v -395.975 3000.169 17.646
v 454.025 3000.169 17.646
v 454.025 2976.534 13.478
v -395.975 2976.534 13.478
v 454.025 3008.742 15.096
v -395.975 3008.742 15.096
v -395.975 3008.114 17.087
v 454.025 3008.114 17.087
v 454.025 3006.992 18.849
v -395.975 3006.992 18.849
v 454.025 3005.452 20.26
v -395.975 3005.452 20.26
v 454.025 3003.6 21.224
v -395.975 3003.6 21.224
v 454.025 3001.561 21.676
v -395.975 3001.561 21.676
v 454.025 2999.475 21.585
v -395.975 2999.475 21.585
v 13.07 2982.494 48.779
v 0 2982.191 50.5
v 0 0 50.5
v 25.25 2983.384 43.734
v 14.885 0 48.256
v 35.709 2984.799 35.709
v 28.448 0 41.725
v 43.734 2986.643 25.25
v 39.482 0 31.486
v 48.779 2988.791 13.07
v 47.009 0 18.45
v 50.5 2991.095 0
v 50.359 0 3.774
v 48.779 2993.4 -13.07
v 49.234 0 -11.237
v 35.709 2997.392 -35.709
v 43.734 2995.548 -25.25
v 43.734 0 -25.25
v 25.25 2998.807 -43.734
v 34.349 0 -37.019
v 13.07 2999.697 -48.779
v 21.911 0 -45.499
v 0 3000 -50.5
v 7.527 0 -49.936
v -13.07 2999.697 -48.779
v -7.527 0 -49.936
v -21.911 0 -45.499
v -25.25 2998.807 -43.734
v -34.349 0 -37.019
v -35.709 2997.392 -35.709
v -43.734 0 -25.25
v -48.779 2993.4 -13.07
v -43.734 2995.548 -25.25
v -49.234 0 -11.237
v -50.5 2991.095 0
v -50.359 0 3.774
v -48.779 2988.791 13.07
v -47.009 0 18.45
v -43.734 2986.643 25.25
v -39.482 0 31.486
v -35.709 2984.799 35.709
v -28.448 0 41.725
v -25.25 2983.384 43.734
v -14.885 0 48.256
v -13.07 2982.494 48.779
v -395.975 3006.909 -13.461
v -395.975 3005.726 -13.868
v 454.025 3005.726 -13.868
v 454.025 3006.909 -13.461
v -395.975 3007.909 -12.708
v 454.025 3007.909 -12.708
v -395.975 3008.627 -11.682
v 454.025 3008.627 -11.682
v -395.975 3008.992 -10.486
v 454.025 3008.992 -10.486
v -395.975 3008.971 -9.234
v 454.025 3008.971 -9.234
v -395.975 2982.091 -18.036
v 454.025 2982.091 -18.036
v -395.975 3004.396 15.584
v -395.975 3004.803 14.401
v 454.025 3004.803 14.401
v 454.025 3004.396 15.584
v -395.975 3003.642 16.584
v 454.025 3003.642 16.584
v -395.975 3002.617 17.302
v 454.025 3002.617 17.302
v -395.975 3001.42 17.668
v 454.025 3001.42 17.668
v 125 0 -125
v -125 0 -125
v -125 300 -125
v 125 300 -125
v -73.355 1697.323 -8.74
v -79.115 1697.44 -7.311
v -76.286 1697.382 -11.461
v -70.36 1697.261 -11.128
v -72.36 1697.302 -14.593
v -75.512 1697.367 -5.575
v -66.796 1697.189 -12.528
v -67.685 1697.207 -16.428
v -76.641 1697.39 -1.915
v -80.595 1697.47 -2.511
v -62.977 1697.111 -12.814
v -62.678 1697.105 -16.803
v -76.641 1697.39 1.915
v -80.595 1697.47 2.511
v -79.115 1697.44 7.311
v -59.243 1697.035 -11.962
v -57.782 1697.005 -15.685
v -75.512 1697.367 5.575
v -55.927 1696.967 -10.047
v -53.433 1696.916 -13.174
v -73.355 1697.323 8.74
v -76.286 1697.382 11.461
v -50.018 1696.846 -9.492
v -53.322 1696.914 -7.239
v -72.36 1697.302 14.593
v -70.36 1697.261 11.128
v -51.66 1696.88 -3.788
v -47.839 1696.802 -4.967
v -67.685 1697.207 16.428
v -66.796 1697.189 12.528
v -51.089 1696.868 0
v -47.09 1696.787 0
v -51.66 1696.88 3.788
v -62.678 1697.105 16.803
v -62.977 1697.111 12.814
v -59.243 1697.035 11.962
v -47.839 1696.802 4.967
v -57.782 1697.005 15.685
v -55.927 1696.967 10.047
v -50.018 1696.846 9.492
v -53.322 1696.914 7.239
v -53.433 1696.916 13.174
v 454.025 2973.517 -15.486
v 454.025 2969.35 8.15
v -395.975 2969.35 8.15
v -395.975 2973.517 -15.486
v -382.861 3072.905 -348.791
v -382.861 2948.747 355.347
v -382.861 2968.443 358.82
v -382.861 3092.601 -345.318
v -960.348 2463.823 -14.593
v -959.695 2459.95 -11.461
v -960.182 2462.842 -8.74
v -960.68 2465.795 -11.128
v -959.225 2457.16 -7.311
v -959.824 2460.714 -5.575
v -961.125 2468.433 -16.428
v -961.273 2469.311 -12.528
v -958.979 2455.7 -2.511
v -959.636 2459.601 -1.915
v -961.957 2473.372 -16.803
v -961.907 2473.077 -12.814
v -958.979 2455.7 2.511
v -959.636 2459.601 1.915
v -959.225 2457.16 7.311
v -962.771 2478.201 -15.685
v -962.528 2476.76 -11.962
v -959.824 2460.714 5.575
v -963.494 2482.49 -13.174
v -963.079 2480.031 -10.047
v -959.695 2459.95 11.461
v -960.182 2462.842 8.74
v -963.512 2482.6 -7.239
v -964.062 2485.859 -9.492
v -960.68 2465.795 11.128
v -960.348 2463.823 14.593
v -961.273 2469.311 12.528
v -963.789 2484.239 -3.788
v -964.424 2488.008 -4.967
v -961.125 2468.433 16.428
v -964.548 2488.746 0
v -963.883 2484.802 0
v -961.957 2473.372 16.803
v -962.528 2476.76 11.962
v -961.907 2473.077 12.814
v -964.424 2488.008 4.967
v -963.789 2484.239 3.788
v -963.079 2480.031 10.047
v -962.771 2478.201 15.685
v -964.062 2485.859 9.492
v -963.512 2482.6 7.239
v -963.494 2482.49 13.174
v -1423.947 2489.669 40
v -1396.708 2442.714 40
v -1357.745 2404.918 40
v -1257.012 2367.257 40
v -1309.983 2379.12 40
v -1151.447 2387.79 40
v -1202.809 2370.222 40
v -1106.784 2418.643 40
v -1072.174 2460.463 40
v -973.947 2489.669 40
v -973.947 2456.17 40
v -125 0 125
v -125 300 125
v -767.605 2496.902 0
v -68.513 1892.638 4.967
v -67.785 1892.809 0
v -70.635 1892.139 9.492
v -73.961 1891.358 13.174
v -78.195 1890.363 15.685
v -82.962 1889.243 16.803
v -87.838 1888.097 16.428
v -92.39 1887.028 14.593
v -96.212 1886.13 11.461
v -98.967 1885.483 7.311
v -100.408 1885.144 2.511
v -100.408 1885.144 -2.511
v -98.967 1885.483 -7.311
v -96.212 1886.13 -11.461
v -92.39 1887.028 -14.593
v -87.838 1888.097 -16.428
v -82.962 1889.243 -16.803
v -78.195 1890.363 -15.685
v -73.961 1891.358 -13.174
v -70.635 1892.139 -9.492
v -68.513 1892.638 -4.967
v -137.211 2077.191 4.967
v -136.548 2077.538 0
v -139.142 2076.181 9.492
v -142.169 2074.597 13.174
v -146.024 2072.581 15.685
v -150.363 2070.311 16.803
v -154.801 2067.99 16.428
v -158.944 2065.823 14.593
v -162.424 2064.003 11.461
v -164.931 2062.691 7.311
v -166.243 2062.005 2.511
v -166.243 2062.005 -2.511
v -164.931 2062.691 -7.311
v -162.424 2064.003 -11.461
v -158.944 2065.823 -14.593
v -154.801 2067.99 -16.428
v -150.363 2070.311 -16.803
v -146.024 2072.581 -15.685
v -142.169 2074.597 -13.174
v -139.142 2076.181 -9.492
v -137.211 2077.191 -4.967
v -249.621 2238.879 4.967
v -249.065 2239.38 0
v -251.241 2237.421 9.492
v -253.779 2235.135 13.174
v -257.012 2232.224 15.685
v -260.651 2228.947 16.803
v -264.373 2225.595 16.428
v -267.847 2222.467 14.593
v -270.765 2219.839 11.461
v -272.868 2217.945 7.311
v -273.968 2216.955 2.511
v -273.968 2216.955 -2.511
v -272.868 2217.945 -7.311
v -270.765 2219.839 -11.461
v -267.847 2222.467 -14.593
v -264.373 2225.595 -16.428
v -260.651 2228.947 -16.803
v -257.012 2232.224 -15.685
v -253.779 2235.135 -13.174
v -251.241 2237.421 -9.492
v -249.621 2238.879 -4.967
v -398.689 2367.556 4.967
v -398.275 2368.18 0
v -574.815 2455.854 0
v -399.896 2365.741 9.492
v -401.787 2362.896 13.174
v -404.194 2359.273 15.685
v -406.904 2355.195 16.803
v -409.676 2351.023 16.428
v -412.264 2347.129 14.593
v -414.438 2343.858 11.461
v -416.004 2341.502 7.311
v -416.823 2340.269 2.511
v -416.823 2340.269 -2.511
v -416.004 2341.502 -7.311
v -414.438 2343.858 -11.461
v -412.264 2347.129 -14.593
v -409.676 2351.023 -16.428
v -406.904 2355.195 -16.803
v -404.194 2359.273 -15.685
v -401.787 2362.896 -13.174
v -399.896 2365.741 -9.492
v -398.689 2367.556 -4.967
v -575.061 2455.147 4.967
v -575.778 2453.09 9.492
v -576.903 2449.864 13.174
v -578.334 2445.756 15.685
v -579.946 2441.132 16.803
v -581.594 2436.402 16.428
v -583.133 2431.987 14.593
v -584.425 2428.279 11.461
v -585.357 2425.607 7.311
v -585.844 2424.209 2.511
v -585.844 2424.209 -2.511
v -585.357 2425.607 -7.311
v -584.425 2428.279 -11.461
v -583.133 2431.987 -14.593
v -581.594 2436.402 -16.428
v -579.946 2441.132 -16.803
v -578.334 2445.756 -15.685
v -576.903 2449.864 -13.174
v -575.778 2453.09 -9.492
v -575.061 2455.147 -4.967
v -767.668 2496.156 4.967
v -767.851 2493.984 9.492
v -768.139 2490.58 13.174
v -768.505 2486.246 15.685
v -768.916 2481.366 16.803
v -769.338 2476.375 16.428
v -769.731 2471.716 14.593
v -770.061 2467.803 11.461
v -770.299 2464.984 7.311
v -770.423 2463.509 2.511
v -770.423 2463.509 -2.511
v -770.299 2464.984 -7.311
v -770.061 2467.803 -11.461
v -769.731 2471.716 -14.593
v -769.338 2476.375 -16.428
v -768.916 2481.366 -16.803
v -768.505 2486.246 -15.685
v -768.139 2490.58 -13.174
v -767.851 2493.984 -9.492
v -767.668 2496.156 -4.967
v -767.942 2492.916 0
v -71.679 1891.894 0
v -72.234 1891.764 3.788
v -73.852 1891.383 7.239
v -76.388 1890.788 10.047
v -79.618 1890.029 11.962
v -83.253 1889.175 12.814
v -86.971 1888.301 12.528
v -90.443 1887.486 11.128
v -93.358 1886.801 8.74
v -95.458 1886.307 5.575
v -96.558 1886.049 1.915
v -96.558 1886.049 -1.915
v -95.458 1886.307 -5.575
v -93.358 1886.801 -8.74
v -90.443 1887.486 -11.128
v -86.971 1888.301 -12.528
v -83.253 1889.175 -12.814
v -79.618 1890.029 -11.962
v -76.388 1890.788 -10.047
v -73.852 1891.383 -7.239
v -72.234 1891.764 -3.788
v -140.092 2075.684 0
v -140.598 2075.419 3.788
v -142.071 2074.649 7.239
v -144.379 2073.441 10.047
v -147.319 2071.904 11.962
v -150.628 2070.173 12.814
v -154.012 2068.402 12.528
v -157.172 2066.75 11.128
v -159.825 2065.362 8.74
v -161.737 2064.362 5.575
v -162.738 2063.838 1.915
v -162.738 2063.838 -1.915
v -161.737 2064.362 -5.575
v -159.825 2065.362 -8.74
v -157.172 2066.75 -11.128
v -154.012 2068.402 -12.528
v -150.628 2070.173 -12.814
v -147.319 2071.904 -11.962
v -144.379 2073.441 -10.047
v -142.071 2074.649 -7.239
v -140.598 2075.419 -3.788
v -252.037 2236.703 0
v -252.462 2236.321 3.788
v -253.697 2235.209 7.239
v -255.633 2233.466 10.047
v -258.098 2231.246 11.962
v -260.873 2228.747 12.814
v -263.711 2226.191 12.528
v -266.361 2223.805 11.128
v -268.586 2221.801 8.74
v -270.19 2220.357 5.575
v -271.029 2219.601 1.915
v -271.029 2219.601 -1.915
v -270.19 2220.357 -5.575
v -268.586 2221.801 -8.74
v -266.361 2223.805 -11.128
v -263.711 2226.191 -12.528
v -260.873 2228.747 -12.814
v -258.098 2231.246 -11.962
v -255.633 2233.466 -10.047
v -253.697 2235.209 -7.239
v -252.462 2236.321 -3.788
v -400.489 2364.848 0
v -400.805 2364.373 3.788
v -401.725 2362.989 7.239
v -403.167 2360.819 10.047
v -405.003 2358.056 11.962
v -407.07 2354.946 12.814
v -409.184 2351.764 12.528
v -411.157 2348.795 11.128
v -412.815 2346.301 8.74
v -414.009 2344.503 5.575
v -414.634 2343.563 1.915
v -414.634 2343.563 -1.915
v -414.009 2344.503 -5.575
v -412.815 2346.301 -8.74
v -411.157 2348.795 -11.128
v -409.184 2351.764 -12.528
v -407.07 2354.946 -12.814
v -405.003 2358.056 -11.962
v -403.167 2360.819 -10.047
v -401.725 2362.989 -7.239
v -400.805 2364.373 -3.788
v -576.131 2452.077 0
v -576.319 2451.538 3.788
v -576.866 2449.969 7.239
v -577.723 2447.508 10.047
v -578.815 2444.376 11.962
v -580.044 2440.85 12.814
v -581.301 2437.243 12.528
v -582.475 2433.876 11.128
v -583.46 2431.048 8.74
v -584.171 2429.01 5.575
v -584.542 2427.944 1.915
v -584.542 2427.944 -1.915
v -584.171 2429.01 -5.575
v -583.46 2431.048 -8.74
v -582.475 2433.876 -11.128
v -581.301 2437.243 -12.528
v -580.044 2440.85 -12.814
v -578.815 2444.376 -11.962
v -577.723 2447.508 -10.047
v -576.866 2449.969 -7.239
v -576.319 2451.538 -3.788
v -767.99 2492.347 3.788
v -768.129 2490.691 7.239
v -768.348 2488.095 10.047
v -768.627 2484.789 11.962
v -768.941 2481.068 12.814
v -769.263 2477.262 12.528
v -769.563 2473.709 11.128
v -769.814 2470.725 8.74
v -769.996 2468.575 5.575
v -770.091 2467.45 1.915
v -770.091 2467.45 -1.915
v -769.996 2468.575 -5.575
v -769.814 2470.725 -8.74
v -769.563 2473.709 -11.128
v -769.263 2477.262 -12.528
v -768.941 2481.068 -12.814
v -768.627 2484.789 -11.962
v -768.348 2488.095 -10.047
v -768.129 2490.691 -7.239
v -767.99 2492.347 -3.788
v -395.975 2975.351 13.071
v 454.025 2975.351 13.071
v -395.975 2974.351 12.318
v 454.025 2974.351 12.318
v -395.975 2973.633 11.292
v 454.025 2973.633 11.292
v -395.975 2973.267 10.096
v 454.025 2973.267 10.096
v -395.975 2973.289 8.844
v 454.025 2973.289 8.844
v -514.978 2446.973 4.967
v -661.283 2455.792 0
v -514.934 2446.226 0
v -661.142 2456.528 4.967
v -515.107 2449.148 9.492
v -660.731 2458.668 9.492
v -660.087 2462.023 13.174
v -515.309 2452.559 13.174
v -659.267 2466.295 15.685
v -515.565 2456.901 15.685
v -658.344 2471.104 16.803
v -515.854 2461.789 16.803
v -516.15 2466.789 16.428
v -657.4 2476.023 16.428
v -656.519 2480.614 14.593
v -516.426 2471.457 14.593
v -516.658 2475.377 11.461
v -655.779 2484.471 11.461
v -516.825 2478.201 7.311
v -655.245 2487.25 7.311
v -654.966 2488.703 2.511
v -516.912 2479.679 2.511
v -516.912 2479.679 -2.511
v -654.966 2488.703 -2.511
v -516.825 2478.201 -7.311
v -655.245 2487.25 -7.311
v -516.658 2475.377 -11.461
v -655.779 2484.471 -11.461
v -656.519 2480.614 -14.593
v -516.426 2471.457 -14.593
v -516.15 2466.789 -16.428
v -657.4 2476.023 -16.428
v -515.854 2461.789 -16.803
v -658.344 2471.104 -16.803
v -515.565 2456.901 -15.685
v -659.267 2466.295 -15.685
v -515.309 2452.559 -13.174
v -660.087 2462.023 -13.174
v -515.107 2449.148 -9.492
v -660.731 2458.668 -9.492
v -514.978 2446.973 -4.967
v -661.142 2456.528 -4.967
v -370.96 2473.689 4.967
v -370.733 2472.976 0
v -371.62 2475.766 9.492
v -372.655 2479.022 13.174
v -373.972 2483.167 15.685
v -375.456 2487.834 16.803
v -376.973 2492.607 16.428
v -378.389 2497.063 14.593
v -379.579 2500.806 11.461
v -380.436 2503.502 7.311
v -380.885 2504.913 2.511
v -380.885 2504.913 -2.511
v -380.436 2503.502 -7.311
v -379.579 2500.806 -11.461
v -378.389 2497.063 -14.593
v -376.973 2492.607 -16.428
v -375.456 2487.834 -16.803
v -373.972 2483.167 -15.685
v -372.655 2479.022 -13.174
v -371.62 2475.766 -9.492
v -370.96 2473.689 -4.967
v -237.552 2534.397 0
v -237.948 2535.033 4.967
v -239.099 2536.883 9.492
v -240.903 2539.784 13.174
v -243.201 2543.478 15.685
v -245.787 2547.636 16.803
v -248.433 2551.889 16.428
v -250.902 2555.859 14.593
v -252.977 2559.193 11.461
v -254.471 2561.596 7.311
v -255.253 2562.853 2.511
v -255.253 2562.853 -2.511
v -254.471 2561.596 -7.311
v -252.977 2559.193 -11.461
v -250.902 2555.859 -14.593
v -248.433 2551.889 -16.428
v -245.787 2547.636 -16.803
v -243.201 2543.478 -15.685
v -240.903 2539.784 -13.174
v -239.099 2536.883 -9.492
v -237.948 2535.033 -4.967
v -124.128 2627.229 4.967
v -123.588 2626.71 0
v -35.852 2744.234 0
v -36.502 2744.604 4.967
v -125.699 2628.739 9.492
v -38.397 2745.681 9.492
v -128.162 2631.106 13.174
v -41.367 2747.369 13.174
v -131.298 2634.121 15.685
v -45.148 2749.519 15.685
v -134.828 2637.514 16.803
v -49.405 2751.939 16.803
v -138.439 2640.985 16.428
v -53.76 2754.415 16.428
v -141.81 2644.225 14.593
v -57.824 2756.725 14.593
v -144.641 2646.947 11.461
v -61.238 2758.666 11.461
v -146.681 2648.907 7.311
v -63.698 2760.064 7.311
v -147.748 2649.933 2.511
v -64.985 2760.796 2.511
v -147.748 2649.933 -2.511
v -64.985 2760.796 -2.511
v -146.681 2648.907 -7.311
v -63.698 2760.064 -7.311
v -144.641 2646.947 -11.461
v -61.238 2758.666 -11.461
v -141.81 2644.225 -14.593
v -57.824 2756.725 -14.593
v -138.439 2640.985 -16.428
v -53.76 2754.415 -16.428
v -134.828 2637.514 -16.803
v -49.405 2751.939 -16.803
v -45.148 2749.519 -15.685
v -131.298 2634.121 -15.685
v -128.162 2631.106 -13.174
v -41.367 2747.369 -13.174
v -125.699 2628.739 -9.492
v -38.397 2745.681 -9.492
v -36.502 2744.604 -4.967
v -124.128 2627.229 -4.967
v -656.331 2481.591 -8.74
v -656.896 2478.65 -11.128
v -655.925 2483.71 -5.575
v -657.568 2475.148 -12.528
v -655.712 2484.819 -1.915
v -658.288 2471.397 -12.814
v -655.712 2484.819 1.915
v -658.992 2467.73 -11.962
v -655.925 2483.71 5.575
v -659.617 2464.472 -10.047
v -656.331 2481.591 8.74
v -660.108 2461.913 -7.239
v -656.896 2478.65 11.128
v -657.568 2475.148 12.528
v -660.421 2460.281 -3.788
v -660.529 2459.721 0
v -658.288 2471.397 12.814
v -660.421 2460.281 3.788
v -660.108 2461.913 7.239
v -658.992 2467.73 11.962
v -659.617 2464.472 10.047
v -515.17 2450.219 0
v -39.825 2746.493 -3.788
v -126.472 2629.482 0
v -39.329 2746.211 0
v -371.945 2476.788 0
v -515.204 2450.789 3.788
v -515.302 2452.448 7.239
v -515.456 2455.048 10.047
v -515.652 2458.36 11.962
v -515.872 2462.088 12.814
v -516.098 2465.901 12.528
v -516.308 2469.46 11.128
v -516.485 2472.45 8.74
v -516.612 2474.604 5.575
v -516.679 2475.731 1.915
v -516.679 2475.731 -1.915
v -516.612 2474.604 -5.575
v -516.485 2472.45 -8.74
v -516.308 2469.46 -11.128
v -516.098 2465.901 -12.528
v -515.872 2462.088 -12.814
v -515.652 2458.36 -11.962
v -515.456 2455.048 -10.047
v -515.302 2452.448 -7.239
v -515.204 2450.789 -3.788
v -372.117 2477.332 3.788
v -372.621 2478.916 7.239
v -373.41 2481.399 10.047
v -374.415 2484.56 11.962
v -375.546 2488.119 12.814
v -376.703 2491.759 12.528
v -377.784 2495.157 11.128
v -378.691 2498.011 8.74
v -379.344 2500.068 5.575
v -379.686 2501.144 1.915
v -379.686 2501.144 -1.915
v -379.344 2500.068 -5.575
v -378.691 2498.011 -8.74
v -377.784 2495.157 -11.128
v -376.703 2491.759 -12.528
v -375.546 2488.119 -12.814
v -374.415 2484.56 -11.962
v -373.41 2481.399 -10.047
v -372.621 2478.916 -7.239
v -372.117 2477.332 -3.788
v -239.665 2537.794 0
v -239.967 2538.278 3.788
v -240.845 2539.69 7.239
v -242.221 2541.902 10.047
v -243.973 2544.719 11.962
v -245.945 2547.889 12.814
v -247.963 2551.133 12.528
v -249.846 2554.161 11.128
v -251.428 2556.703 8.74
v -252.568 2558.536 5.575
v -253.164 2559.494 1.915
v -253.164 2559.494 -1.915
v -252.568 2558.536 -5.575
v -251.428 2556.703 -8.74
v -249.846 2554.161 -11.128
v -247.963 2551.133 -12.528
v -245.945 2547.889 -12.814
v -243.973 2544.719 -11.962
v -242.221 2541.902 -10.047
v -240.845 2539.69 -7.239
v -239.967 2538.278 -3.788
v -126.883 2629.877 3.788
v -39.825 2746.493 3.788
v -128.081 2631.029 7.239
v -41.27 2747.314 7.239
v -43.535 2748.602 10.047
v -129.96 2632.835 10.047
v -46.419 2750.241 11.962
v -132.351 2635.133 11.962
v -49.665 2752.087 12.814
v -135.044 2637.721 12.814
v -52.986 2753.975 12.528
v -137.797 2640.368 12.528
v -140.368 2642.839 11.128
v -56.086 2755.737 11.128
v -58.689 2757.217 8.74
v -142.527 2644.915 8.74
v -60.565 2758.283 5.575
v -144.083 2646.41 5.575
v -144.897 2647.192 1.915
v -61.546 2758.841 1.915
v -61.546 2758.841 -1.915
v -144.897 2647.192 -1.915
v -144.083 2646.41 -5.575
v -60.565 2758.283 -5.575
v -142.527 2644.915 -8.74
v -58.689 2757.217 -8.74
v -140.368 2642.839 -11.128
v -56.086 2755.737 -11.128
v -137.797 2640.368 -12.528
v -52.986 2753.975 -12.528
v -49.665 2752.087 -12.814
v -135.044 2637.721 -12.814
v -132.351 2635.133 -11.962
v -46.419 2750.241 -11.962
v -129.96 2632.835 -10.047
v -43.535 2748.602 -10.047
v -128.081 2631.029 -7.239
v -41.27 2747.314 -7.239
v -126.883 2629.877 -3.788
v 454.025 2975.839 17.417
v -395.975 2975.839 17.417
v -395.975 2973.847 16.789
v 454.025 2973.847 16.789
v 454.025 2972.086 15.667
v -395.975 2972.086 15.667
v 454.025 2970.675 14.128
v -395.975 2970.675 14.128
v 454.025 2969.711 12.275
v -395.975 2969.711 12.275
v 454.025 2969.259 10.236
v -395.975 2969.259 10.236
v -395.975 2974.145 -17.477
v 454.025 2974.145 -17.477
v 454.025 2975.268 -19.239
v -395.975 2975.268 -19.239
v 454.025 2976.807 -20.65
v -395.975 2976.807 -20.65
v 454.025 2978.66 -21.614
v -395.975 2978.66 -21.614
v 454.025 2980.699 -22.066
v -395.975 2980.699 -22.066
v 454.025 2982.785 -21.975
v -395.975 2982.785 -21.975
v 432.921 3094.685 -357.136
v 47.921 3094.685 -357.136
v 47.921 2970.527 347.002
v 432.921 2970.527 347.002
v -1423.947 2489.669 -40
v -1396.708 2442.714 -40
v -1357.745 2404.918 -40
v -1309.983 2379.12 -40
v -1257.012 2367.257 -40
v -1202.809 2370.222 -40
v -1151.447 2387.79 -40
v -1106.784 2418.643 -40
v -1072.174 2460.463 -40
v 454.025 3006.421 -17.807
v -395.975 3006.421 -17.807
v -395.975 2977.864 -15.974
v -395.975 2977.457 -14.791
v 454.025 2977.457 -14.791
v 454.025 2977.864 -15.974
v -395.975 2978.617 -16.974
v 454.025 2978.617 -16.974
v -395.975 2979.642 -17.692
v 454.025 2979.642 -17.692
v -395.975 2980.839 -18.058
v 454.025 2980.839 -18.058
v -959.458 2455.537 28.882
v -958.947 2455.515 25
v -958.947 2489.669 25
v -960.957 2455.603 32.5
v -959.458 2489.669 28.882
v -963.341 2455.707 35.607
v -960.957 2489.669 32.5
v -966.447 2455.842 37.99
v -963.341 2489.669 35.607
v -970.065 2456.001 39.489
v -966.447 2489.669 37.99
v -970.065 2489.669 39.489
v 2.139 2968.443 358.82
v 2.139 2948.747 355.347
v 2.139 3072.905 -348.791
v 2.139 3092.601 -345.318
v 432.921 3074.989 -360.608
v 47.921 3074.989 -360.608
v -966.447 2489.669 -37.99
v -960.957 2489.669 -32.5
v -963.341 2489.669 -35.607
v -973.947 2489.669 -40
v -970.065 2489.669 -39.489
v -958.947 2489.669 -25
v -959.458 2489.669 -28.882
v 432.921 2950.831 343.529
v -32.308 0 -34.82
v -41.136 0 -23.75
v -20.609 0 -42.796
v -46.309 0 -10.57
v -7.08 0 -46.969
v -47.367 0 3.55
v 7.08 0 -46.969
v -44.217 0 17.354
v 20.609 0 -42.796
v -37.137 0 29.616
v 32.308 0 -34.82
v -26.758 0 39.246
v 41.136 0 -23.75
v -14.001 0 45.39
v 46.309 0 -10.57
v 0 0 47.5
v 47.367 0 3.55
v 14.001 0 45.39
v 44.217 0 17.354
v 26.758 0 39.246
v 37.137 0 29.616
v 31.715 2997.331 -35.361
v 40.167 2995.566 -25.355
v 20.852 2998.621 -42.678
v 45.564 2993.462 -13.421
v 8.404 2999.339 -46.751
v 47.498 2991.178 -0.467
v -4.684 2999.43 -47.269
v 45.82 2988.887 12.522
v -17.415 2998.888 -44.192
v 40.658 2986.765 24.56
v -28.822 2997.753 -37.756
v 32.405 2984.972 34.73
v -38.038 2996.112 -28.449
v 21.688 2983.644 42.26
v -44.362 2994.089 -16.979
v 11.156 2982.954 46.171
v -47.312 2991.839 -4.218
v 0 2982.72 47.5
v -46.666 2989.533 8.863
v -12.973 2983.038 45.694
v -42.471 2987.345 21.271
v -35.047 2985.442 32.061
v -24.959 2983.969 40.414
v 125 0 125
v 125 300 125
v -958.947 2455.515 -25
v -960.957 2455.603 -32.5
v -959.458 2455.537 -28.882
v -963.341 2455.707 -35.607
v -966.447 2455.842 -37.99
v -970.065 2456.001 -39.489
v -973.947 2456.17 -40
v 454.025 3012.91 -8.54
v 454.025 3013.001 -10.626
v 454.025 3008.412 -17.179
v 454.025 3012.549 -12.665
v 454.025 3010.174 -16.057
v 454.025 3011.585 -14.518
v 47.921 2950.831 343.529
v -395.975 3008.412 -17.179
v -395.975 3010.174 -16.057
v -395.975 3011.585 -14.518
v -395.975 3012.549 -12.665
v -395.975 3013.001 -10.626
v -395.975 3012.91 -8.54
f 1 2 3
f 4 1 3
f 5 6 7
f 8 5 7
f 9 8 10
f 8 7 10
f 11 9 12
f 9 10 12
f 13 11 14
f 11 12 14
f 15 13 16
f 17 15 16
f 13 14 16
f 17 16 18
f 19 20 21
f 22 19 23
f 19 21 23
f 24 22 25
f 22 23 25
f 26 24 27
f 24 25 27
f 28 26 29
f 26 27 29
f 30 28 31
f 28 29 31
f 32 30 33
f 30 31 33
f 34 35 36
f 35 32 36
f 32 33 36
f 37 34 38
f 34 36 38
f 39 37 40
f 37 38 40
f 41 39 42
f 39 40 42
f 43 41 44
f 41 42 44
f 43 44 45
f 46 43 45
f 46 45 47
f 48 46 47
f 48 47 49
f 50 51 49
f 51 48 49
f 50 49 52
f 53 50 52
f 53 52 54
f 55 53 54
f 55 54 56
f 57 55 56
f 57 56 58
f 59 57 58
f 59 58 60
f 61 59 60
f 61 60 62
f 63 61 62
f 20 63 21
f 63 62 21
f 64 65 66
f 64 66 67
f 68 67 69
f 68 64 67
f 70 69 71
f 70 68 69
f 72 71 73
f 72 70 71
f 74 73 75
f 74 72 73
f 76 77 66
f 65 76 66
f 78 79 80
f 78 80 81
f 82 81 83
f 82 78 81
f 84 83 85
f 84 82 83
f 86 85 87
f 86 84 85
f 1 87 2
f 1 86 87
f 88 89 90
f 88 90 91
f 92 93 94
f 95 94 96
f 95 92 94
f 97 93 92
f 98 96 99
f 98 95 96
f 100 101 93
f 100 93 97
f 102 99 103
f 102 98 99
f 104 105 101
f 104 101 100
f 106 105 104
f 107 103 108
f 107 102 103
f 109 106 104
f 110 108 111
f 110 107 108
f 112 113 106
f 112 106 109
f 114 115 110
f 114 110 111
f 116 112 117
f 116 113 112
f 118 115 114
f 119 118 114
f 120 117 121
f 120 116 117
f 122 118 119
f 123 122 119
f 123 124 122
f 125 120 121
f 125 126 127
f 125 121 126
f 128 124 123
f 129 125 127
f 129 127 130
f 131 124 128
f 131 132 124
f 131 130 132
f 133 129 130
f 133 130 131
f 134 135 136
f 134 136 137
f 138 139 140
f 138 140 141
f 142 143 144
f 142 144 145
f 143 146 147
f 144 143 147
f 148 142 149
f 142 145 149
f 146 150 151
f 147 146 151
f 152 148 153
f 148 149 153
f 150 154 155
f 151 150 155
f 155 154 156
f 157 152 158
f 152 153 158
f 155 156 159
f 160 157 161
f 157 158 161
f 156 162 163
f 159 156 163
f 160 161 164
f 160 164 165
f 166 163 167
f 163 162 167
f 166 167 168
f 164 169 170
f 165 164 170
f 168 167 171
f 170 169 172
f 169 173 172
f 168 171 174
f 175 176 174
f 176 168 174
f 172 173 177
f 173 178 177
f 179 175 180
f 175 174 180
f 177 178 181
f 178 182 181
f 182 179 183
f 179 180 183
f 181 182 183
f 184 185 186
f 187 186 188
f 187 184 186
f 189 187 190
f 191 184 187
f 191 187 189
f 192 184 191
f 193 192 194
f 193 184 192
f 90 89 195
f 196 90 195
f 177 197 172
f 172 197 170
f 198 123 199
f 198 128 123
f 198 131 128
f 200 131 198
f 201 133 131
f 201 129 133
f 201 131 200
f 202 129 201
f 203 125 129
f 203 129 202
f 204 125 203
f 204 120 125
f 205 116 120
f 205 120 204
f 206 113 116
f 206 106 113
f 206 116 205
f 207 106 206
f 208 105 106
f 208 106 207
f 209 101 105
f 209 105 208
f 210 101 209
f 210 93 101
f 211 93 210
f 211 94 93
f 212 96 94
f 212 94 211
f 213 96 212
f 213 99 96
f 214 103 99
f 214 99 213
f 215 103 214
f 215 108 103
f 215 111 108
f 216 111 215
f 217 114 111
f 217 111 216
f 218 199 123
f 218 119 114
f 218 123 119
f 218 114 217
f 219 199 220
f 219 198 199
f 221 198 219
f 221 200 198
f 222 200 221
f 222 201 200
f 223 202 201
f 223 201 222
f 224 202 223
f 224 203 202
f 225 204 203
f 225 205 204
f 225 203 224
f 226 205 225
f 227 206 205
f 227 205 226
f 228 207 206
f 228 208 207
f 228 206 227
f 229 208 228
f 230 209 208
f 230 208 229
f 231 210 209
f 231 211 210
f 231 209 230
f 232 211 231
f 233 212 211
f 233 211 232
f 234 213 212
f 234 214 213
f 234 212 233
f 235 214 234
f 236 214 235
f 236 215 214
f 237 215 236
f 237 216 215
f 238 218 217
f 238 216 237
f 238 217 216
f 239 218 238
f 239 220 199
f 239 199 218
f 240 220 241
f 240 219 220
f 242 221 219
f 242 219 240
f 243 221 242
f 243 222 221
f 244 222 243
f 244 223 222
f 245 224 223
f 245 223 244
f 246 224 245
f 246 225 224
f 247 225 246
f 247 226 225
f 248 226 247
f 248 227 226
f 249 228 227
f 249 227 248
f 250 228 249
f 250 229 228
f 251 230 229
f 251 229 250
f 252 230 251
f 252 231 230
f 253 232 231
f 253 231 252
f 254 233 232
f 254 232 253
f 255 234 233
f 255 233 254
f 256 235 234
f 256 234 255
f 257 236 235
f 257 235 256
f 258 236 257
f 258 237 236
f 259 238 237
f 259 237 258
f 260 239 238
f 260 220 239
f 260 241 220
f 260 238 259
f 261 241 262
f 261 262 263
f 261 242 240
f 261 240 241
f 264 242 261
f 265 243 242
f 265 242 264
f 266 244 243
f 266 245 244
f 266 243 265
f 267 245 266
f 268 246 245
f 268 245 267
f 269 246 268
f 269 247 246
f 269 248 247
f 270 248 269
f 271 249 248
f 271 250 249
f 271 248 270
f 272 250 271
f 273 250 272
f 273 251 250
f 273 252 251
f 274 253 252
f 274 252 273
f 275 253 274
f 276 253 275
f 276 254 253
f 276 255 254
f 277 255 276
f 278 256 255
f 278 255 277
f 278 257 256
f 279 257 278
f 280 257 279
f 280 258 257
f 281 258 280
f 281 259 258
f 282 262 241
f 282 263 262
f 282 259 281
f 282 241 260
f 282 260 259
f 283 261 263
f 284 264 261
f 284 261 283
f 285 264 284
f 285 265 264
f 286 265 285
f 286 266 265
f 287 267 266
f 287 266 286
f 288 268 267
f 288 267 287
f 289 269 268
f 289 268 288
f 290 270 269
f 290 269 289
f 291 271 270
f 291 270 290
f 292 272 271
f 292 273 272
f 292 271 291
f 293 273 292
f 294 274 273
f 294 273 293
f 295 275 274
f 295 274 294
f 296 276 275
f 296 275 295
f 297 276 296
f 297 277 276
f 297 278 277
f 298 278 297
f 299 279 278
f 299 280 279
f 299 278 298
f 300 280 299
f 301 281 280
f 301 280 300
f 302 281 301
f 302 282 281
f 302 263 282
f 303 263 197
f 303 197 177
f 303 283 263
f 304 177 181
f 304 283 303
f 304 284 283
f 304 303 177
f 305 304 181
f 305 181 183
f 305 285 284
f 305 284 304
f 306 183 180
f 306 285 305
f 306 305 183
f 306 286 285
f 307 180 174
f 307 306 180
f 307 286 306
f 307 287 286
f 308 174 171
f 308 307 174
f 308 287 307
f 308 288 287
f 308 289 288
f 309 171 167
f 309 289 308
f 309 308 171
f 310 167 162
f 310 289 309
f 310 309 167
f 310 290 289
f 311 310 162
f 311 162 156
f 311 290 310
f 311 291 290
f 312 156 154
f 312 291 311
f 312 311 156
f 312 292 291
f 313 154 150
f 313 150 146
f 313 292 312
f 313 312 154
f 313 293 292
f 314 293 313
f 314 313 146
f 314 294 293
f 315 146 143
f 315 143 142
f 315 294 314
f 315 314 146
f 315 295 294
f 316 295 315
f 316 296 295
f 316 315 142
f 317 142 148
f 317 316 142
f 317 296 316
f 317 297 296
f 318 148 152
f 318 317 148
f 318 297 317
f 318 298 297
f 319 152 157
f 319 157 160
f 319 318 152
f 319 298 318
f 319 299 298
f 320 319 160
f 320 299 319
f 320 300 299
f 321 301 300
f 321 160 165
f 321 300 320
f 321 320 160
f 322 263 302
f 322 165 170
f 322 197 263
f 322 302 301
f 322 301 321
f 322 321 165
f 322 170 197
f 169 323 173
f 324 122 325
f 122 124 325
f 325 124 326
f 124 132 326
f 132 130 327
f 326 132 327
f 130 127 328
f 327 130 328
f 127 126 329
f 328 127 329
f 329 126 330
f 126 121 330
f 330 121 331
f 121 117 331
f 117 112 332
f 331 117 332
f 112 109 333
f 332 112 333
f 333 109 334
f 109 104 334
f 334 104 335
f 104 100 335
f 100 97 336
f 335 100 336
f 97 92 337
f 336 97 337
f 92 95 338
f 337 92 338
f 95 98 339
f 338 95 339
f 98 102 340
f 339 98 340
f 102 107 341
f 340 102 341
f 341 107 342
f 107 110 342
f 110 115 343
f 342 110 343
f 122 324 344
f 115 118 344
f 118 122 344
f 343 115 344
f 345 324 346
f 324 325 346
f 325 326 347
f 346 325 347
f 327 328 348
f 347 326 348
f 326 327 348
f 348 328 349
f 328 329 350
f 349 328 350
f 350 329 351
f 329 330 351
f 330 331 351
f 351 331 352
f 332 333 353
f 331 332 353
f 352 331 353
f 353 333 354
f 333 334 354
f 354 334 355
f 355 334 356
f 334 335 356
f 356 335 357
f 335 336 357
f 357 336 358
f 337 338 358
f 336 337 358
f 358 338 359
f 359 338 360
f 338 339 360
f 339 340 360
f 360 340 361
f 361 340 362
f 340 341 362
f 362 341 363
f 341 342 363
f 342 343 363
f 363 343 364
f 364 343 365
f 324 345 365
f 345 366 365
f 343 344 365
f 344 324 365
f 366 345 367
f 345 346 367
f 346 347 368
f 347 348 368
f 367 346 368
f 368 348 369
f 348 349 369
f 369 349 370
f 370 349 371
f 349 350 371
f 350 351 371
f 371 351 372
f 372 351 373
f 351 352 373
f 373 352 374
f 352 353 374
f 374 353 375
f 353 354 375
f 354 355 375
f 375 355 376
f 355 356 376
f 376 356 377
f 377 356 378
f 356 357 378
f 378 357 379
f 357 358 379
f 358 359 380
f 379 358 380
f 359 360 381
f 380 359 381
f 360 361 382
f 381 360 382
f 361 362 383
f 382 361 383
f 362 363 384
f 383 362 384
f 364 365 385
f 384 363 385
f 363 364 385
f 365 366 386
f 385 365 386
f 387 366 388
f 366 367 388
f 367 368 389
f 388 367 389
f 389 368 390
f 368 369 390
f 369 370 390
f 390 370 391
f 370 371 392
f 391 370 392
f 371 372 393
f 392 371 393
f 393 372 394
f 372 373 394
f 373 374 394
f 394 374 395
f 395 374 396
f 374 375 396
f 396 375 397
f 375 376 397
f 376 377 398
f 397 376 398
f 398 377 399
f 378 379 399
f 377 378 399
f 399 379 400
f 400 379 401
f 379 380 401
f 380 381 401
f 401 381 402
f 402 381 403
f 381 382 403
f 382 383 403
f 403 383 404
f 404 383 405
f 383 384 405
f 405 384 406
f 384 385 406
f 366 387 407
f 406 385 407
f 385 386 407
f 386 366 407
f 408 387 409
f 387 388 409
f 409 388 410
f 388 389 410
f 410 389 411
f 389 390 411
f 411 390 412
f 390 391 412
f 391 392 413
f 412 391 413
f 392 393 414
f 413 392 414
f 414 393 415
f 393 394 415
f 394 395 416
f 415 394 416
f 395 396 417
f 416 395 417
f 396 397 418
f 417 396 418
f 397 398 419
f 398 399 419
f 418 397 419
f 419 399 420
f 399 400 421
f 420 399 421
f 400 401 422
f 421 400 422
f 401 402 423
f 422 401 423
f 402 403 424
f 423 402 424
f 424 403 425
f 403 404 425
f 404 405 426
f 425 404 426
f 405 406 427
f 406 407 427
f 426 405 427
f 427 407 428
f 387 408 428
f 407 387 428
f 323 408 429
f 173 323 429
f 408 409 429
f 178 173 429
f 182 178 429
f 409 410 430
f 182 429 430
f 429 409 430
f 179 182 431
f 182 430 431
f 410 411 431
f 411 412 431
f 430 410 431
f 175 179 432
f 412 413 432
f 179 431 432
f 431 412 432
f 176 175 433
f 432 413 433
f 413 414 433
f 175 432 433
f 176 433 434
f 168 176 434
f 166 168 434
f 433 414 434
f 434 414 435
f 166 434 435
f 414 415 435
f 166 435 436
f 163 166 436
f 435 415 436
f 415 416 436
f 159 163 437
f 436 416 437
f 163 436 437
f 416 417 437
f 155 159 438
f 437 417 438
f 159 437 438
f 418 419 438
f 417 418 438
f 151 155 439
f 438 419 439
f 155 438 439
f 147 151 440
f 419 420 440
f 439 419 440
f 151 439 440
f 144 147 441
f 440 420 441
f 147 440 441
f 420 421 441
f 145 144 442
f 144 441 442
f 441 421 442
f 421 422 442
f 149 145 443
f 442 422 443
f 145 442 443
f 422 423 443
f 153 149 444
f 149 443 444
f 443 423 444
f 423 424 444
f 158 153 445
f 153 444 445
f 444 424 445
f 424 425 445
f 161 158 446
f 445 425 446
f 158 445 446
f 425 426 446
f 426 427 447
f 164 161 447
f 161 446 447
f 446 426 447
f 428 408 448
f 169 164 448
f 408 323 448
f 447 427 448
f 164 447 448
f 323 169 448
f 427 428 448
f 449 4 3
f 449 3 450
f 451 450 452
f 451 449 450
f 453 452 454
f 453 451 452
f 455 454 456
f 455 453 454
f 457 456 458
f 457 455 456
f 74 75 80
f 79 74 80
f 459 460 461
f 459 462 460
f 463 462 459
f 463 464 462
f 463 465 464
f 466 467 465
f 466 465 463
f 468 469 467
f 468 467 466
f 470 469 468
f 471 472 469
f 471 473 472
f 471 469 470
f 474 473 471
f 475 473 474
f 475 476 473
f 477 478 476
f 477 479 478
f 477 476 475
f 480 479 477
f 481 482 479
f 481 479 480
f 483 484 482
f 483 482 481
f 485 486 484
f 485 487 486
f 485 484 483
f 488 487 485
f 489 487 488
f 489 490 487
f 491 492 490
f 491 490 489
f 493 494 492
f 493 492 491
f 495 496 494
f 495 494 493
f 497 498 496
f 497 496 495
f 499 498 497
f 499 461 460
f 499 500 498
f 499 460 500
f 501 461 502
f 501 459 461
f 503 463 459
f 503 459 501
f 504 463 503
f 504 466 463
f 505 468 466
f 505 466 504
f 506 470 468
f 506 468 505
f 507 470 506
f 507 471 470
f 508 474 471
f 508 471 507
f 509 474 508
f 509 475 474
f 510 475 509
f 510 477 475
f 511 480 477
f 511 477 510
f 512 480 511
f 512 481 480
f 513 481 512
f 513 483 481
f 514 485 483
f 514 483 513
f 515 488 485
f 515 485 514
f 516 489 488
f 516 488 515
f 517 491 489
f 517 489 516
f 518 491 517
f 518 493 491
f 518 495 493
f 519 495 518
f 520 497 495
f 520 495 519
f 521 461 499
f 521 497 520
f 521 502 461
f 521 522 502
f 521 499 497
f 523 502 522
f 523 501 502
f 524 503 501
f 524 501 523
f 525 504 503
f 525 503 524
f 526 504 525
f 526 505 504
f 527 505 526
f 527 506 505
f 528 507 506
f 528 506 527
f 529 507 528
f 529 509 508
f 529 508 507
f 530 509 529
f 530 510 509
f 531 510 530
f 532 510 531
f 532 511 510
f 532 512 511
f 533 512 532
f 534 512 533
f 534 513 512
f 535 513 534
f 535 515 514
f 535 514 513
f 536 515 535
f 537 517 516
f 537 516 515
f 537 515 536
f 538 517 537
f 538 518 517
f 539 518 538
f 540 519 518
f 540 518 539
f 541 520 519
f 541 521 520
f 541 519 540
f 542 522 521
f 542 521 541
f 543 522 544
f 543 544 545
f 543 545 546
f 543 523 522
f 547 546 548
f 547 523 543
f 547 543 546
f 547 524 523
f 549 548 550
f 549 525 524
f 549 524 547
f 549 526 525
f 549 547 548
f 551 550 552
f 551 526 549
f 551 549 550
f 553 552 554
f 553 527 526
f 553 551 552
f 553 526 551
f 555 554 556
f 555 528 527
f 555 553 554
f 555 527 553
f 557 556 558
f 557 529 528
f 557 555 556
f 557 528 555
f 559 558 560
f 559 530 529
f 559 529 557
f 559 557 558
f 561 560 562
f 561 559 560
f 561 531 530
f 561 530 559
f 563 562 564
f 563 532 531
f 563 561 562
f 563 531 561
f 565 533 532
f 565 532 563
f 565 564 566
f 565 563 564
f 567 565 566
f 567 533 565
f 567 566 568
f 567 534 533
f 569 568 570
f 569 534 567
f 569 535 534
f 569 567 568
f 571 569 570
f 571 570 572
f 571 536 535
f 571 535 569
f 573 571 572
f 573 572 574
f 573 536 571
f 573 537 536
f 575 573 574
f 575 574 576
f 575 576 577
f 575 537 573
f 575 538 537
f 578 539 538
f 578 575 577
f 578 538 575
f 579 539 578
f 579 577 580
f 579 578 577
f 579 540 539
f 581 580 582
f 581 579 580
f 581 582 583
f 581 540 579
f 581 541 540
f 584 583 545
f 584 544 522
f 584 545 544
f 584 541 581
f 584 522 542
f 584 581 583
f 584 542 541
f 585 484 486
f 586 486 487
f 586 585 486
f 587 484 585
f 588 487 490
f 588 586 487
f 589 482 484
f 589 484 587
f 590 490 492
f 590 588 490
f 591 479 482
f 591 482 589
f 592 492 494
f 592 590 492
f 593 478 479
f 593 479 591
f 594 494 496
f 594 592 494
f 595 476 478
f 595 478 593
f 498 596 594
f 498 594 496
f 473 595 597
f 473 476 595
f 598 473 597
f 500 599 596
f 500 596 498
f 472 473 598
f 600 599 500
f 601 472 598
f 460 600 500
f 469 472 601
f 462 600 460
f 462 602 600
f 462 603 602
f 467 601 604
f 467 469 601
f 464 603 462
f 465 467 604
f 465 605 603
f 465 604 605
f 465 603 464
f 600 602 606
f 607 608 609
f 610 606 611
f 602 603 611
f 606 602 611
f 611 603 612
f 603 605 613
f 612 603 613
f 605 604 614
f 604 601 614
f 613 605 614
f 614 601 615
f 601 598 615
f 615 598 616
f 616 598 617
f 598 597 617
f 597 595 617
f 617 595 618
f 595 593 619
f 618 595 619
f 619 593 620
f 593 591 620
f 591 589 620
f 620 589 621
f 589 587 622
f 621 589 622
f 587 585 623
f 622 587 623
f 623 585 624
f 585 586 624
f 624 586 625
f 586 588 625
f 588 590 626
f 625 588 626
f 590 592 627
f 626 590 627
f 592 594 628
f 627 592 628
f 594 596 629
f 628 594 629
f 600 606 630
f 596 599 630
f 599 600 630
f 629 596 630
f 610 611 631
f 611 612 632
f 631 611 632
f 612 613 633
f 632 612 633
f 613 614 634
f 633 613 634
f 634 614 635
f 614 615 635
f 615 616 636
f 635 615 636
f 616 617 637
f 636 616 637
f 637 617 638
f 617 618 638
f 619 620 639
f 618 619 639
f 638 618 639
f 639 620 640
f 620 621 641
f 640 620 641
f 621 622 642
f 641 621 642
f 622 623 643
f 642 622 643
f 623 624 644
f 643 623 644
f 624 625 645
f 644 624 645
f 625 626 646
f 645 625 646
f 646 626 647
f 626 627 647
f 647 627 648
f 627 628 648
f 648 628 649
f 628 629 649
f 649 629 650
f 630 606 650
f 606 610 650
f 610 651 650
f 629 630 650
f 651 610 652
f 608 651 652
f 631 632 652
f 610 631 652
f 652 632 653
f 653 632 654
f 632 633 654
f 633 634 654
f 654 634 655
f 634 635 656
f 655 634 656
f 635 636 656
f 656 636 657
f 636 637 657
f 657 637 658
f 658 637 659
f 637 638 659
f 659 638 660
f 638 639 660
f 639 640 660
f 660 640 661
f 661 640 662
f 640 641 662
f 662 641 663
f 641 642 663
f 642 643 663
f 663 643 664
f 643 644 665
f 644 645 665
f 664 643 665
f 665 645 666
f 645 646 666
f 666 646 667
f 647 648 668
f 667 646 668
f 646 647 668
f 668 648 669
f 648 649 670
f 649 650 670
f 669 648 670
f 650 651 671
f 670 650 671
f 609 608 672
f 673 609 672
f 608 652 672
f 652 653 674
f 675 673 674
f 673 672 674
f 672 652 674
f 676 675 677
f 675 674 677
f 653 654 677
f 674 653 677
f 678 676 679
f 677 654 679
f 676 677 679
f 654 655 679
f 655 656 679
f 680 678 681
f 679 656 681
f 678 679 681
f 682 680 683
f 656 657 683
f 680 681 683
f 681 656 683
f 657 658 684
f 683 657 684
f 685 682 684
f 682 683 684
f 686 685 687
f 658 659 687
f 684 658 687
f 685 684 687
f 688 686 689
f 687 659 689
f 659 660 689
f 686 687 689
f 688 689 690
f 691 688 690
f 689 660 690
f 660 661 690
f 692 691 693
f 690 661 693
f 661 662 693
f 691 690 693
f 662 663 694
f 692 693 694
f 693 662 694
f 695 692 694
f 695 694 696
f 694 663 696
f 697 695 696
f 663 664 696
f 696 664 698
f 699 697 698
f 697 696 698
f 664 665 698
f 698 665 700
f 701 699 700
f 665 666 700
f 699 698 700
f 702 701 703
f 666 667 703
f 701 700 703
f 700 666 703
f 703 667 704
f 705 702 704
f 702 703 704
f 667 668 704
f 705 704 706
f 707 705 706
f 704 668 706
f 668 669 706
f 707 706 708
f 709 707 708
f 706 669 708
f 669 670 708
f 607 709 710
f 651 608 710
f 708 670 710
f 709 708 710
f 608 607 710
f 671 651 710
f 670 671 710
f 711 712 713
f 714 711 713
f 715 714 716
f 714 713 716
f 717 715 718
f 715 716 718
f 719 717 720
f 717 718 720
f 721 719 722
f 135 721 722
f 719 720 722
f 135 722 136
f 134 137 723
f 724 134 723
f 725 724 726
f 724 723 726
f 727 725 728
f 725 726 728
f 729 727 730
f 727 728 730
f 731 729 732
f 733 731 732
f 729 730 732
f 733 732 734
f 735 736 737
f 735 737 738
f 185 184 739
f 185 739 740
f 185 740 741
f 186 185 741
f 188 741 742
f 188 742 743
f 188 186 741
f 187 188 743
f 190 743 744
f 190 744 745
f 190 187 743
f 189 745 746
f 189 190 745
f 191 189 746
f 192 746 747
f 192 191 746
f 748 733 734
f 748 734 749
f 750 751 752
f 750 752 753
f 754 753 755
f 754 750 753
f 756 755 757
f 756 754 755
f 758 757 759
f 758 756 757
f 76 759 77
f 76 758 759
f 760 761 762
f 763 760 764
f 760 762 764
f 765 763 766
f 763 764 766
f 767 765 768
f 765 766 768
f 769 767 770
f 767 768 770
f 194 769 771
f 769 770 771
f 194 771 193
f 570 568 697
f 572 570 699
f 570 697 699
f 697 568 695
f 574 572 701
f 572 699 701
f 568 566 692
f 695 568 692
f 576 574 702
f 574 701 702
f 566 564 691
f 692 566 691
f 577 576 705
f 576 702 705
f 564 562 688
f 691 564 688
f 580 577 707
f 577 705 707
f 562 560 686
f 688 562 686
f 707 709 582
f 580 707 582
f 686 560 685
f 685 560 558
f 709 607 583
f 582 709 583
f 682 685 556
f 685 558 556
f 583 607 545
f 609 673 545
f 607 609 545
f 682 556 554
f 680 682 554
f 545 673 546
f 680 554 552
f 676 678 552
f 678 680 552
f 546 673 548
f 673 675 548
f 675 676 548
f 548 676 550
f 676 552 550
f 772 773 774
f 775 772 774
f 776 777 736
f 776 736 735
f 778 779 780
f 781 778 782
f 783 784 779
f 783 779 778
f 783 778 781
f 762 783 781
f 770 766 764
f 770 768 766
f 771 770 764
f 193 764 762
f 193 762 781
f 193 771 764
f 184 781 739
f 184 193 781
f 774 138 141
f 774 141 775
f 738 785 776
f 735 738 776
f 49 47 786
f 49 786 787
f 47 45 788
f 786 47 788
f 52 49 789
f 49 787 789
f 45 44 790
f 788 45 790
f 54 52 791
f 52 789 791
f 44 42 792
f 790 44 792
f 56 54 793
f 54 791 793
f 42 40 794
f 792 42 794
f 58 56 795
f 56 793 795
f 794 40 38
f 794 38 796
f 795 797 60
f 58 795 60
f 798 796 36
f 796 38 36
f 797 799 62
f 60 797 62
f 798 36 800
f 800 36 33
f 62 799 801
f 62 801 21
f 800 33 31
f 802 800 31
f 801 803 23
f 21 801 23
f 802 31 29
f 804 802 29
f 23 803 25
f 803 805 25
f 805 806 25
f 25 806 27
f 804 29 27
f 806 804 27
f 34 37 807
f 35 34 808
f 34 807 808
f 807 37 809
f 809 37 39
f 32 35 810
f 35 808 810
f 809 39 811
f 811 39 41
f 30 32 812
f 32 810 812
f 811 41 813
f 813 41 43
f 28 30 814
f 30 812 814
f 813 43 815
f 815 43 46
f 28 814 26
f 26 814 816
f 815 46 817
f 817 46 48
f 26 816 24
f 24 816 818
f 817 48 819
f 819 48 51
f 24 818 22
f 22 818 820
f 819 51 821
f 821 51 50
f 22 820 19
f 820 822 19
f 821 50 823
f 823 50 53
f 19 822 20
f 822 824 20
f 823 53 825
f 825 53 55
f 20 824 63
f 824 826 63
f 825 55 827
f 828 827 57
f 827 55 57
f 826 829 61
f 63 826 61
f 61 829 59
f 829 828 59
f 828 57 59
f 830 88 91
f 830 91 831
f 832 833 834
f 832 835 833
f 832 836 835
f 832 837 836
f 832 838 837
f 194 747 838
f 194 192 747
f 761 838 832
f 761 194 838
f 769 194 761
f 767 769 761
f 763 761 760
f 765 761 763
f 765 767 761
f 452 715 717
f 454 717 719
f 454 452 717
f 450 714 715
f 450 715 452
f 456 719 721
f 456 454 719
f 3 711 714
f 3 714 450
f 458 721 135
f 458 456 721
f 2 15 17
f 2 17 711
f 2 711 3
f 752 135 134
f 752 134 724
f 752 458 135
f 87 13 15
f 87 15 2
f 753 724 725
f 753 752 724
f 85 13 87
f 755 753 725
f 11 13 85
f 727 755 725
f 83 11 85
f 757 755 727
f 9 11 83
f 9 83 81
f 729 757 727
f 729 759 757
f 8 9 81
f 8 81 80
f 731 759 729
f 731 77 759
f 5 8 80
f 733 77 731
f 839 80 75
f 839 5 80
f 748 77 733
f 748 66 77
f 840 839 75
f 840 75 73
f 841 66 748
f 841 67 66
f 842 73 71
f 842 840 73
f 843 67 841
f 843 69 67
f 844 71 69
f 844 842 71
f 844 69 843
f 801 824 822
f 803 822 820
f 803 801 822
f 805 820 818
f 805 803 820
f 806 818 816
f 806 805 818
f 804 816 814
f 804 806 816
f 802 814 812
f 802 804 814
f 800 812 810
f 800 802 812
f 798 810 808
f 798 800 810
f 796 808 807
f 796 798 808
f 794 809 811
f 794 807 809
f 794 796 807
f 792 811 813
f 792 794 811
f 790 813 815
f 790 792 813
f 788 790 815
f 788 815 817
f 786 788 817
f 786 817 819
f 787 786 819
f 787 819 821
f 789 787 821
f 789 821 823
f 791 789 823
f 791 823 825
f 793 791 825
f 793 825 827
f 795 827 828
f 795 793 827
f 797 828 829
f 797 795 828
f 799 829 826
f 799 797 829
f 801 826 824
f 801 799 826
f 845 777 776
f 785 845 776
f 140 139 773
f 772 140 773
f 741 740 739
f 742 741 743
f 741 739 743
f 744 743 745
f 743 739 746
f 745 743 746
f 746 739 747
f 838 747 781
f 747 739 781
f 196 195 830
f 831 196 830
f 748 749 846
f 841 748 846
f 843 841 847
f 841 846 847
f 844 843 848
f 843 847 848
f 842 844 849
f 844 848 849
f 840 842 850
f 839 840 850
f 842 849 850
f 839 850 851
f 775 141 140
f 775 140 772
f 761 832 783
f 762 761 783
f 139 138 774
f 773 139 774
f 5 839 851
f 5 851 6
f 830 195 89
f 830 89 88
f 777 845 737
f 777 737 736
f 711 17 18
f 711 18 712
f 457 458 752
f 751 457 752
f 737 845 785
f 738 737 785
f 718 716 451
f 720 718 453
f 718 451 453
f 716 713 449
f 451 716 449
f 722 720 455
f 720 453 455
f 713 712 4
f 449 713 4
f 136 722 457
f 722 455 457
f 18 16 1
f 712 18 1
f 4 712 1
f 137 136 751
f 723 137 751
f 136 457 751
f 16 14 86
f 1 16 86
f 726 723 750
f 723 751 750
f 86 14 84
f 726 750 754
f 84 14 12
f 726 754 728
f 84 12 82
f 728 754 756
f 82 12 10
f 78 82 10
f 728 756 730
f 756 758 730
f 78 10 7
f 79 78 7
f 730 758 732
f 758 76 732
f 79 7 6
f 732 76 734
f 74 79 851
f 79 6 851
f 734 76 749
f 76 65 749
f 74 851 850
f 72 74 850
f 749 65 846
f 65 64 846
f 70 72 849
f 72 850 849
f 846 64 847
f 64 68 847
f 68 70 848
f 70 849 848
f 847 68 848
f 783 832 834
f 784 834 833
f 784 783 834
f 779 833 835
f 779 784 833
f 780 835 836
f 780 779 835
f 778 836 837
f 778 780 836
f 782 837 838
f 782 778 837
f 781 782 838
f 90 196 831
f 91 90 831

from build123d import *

# Parameters (mm, degrees)
SKETCH1_R                                  = 50.5
SKETCH1_R_2                                = 47.5
BOSS_EXTRUDE1_DEPTH                        = 3000
PIPE_CONFIGURED_33_7_X_4_0_1_OUTLINE_R     = 16.85
PIPE_CONFIGURED_33_7_X_4_0_1_OUTLINE_R_2   = 12.85
PIPE_CONFIGURED_33_7_X_4_0_1_ANGLE         = 71.246614
PIPE_CONFIGURED_33_7_X_4_0_1_2_OUTLINE_R   = 16.85
PIPE_CONFIGURED_33_7_X_4_0_1_2_OUTLINE_R_2 = 12.85
PIPE_CONFIGURED_33_7_X_4_0_1_2_ANGLE       = 100.735706
CUT_EXTRUDE1_DEPTH                         = 3152.650905186
CUT_EXTRUDE1_DEPTH_BACK                    = 3152.650905186
SQUARE_TUBE_CONFIGURED_40_X_40_X_4_1_DEPTH = 850
SKETCH15_W                                 = 385
SKETCH15_H                                 = 715
BOSS_EXTRUDE3_DEPTH                        = 20
SKETCH16_W                                 = 385
SKETCH16_H                                 = 715
BOSS_EXTRUDE4_DEPTH                        = 20
BOSS_EXTRUDE5_DEPTH                        = 40
FILLET1_R                                  = 15
SKETCH18_W                                 = 250
SKETCH18_H                                 = 250
BOSS_EXTRUDE6_DEPTH                        = 300


# Read off the part's stored shape, not the designer's step: Pipe - configured 33.7 X 4.0(1)
with BuildPart() as part:
    # Sketch1 → Boss-Extrude1 (new body)
    with BuildSketch(Plane(origin=(0, 0, 0), x_dir=(1, 0, 0), z_dir=(0, 1, 0))):
        with Locations(Location((0, 0, 0), (0, 0, 270))):
            Circle(SKETCH1_R)
        with Locations(Location((0, 0, 0), (0, 0, 270))):
            Circle(SKETCH1_R_2, mode=Mode.SUBTRACT)
    extrude(amount=BOSS_EXTRUDE1_DEPTH)

    # Sketch12 → Cut-Extrude1 (cut, two sides: drawn at the far end of the back side and taken through both)
    with BuildSketch(Plane(origin=(0, 0, 0), x_dir=(0, 0, -1), z_dir=(1, 0, 0)).offset(-CUT_EXTRUDE1_DEPTH_BACK)):
        Polygon((50.5, 3000), (-67.81337246, 2979.138160257), (-67.81337246, 3000), align=None)
    extrude(amount=CUT_EXTRUDE1_DEPTH + CUT_EXTRUDE1_DEPTH_BACK, mode=Mode.SUBTRACT)


with BuildPart() as body_2:
    # Pipe - configured 33.7 X 4.0(1) outline → Pipe - configured 33.7 X 4.0(1) (revolve)
    with BuildSketch(Plane(origin=(-549.839773, 3036.434615231, 0), x_dir=(-0.18849061162568545, -0.9820749917032685, 0), z_dir=(-0.9820749917032685, 0.18849061162568545, 0))):
        with Locations((574.390250582, 0)):
            Circle(PIPE_CONFIGURED_33_7_X_4_0_1_OUTLINE_R)
        with Locations((574.390250582, 0)):
            Circle(PIPE_CONFIGURED_33_7_X_4_0_1_OUTLINE_R_2, mode=Mode.SUBTRACT)
    revolve(axis=Axis((-549.839773, 3036.434615231, 0), (0, 0, 1)), revolution_arc=PIPE_CONFIGURED_33_7_X_4_0_1_ANGLE)


with BuildPart() as body_3:
    # Pipe - configured 33.7 X 4.0_1 2 outline → Pipe - configured 33.7 X 4.0_1 2 (revolve)
    with BuildSketch(Plane(origin=(-833.776532631, 1712.838993172, 0), x_dir=(0.9997918812705326, -0.020400836883055794, 0), z_dir=(-0.020400836883055794, -0.9997918812705326, 0))):
        with Locations((770, 0)):
            Circle(PIPE_CONFIGURED_33_7_X_4_0_1_2_OUTLINE_R)
        with Locations((770, 0)):
            Circle(PIPE_CONFIGURED_33_7_X_4_0_1_2_OUTLINE_R_2, mode=Mode.SUBTRACT)
    revolve(axis=Axis((-833.776532631, 1712.838993172, 0), (0, 0, 1)), revolution_arc=PIPE_CONFIGURED_33_7_X_4_0_1_2_ANGLE)


with BuildPart() as body_4:
    # Sketch14 → Square tube - configured 40 X 40 X 4(1) (new body)
    with BuildSketch(Plane(origin=(-395.975268768, 2991.129870244, -0.194994376), x_dir=(0, 0.17364817766692475, -0.984807753012209), z_dir=(1, 0, 0))):
        with BuildLine():
            Line((-12, -20), (12, -20))
            ThreePointArc((12, -20), (17.656854249, -17.656854249), (20, -12))
            Line((20, -12), (20, 12))
            ThreePointArc((20, 12), (17.656854249, 17.656854249), (12, 20))
            Line((12, 20), (-12, 20))
            ThreePointArc((-12, 20), (-17.656854249, 17.656854249), (-20, 12))
            Line((-20, 12), (-20, -12))
            ThreePointArc((-20, -12), (-17.656854249, -17.656854249), (-12, -20))
        make_face()
        with BuildLine():
            Line((-12, -16), (12, -16))
            ThreePointArc((12, -16), (14.828427125, -14.828427125), (16, -12))
            Line((16, -12), (16, 12))
            ThreePointArc((16, 12), (14.828427125, 14.828427125), (12, 16))
            Line((12, 16), (-12, 16))
            ThreePointArc((-12, 16), (-14.828427125, 14.828427125), (-16, 12))
            Line((-16, 12), (-16, -12))
            ThreePointArc((-16, -12), (-14.828427125, -14.828427125), (-12, -16))
        make_face(mode=Mode.SUBTRACT)
    extrude(amount=SQUARE_TUBE_CONFIGURED_40_X_40_X_4_1_DEPTH)


with BuildPart() as body_5:
    # Sketch15 → Boss-Extrude3 (new body)
    with BuildSketch(Plane(origin=(0, 2920.59907762, 514.980417217), x_dir=(1, 0, 0), z_dir=(0, 0.9848077530122089, 0.17364817766692592))):
        with Locations((-190.361050881, 519.596283107)):
            Rectangle(SKETCH15_W, SKETCH15_H)
    extrude(amount=BOSS_EXTRUDE3_DEPTH)


with BuildPart() as body_6:
    # Sketch16 → Boss-Extrude4 (new body)
    with BuildSketch(Plane(origin=(0, 2920.59907762, 514.980417217), x_dir=(1, 0, 0), z_dir=(0, 0.9848077530122089, 0.17364817766692592))):
        with Locations((240.421444589, 531.596283107)):
            Rectangle(SKETCH16_W, SKETCH16_H)
    extrude(amount=BOSS_EXTRUDE4_DEPTH)


with BuildPart() as body_7:
    # Sketch17 → Boss-Extrude5 (new, symmetric)
    with BuildSketch(Plane.XY):
        with BuildLine():
            Line((-958.947359374, 2455.51468729), (-958.947359374, 2489.669210551))
            Line((-958.947359374, 2489.669210551), (-1423.947359374, 2489.669210551))
            ThreePointArc((-1423.947359374, 2489.669210551), (-1257.011881852, 2367.257370091), (-1072.174349577, 2460.462514816))
            Line((-1072.174349577, 2460.462514816), (-958.947359374, 2455.51468729))
        make_face()
    extrude(amount=BOSS_EXTRUDE5_DEPTH, both=True)

    # Fillet1
    fillet1_edges = [body_7.edges().sort_by_distance(p)[0] for p in [
        (-958.947359374, 2472.59194892, -40),
        (-958.947359374, 2472.59194892, 40),
    ]]
    fillet(fillet1_edges, radius=FILLET1_R)


with BuildPart() as body_8:
    # Sketch18 → Boss-Extrude6 (new body)
    with BuildSketch(Plane.XZ):
        Rectangle(SKETCH18_W, SKETCH18_H)
    extrude(amount=-BOSS_EXTRUDE6_DEPTH)


solid = Compound([part.part, body_2.part, body_3.part, body_4.part, body_5.part, body_6.part, body_7.part, body_8.part])
